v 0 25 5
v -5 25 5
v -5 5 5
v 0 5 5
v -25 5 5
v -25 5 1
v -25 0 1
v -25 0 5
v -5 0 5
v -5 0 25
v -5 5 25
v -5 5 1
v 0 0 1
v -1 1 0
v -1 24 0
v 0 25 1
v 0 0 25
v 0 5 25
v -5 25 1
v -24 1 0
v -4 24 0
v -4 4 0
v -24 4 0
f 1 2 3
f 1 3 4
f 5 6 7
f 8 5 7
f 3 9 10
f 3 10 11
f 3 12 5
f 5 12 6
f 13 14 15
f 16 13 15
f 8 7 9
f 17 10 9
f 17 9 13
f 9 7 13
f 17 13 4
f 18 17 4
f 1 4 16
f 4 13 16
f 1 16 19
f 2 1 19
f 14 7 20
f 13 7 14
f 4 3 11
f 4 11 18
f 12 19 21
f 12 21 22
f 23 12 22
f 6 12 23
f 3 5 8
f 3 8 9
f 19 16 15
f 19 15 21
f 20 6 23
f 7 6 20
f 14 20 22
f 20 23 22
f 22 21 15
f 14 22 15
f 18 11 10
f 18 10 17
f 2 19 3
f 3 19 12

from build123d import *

# Parameters (mm, degrees)
F1_DEPTH = 5
F2_W     = 5
F2_H     = 5
F3_DEPTH = 20
F4_SIZE  = 1


with BuildPart() as f1:
    # F0 (on Top) → F1 (new body)
    with BuildSketch(Plane.XY):
        Polygon((-25, 0), (0, 0), (0, 25), (-5, 25), (-5, 5), (-25, 5), align=None)
    extrude(amount=F1_DEPTH)

    # F2 (on face) → F3 (join)
    with BuildSketch(Plane.XY.offset(5)):
        with Locations((-2.5, 2.5)):
            Rectangle(F2_W, F2_H)
    extrude(amount=F3_DEPTH)

    # F4
    f4_edges = [f1.edges().sort_by_distance(p)[0] for p in [
        (-12.5, 0, 0),
        (0, 12.5, 0),
        (-2.5, 25, 0),
        (-5, 15, 0),
        (-15, 5, 0),
        (-25, 2.5, 0),
    ]]
    chamfer(f4_edges, length=F4_SIZE)


solid = f1.part
